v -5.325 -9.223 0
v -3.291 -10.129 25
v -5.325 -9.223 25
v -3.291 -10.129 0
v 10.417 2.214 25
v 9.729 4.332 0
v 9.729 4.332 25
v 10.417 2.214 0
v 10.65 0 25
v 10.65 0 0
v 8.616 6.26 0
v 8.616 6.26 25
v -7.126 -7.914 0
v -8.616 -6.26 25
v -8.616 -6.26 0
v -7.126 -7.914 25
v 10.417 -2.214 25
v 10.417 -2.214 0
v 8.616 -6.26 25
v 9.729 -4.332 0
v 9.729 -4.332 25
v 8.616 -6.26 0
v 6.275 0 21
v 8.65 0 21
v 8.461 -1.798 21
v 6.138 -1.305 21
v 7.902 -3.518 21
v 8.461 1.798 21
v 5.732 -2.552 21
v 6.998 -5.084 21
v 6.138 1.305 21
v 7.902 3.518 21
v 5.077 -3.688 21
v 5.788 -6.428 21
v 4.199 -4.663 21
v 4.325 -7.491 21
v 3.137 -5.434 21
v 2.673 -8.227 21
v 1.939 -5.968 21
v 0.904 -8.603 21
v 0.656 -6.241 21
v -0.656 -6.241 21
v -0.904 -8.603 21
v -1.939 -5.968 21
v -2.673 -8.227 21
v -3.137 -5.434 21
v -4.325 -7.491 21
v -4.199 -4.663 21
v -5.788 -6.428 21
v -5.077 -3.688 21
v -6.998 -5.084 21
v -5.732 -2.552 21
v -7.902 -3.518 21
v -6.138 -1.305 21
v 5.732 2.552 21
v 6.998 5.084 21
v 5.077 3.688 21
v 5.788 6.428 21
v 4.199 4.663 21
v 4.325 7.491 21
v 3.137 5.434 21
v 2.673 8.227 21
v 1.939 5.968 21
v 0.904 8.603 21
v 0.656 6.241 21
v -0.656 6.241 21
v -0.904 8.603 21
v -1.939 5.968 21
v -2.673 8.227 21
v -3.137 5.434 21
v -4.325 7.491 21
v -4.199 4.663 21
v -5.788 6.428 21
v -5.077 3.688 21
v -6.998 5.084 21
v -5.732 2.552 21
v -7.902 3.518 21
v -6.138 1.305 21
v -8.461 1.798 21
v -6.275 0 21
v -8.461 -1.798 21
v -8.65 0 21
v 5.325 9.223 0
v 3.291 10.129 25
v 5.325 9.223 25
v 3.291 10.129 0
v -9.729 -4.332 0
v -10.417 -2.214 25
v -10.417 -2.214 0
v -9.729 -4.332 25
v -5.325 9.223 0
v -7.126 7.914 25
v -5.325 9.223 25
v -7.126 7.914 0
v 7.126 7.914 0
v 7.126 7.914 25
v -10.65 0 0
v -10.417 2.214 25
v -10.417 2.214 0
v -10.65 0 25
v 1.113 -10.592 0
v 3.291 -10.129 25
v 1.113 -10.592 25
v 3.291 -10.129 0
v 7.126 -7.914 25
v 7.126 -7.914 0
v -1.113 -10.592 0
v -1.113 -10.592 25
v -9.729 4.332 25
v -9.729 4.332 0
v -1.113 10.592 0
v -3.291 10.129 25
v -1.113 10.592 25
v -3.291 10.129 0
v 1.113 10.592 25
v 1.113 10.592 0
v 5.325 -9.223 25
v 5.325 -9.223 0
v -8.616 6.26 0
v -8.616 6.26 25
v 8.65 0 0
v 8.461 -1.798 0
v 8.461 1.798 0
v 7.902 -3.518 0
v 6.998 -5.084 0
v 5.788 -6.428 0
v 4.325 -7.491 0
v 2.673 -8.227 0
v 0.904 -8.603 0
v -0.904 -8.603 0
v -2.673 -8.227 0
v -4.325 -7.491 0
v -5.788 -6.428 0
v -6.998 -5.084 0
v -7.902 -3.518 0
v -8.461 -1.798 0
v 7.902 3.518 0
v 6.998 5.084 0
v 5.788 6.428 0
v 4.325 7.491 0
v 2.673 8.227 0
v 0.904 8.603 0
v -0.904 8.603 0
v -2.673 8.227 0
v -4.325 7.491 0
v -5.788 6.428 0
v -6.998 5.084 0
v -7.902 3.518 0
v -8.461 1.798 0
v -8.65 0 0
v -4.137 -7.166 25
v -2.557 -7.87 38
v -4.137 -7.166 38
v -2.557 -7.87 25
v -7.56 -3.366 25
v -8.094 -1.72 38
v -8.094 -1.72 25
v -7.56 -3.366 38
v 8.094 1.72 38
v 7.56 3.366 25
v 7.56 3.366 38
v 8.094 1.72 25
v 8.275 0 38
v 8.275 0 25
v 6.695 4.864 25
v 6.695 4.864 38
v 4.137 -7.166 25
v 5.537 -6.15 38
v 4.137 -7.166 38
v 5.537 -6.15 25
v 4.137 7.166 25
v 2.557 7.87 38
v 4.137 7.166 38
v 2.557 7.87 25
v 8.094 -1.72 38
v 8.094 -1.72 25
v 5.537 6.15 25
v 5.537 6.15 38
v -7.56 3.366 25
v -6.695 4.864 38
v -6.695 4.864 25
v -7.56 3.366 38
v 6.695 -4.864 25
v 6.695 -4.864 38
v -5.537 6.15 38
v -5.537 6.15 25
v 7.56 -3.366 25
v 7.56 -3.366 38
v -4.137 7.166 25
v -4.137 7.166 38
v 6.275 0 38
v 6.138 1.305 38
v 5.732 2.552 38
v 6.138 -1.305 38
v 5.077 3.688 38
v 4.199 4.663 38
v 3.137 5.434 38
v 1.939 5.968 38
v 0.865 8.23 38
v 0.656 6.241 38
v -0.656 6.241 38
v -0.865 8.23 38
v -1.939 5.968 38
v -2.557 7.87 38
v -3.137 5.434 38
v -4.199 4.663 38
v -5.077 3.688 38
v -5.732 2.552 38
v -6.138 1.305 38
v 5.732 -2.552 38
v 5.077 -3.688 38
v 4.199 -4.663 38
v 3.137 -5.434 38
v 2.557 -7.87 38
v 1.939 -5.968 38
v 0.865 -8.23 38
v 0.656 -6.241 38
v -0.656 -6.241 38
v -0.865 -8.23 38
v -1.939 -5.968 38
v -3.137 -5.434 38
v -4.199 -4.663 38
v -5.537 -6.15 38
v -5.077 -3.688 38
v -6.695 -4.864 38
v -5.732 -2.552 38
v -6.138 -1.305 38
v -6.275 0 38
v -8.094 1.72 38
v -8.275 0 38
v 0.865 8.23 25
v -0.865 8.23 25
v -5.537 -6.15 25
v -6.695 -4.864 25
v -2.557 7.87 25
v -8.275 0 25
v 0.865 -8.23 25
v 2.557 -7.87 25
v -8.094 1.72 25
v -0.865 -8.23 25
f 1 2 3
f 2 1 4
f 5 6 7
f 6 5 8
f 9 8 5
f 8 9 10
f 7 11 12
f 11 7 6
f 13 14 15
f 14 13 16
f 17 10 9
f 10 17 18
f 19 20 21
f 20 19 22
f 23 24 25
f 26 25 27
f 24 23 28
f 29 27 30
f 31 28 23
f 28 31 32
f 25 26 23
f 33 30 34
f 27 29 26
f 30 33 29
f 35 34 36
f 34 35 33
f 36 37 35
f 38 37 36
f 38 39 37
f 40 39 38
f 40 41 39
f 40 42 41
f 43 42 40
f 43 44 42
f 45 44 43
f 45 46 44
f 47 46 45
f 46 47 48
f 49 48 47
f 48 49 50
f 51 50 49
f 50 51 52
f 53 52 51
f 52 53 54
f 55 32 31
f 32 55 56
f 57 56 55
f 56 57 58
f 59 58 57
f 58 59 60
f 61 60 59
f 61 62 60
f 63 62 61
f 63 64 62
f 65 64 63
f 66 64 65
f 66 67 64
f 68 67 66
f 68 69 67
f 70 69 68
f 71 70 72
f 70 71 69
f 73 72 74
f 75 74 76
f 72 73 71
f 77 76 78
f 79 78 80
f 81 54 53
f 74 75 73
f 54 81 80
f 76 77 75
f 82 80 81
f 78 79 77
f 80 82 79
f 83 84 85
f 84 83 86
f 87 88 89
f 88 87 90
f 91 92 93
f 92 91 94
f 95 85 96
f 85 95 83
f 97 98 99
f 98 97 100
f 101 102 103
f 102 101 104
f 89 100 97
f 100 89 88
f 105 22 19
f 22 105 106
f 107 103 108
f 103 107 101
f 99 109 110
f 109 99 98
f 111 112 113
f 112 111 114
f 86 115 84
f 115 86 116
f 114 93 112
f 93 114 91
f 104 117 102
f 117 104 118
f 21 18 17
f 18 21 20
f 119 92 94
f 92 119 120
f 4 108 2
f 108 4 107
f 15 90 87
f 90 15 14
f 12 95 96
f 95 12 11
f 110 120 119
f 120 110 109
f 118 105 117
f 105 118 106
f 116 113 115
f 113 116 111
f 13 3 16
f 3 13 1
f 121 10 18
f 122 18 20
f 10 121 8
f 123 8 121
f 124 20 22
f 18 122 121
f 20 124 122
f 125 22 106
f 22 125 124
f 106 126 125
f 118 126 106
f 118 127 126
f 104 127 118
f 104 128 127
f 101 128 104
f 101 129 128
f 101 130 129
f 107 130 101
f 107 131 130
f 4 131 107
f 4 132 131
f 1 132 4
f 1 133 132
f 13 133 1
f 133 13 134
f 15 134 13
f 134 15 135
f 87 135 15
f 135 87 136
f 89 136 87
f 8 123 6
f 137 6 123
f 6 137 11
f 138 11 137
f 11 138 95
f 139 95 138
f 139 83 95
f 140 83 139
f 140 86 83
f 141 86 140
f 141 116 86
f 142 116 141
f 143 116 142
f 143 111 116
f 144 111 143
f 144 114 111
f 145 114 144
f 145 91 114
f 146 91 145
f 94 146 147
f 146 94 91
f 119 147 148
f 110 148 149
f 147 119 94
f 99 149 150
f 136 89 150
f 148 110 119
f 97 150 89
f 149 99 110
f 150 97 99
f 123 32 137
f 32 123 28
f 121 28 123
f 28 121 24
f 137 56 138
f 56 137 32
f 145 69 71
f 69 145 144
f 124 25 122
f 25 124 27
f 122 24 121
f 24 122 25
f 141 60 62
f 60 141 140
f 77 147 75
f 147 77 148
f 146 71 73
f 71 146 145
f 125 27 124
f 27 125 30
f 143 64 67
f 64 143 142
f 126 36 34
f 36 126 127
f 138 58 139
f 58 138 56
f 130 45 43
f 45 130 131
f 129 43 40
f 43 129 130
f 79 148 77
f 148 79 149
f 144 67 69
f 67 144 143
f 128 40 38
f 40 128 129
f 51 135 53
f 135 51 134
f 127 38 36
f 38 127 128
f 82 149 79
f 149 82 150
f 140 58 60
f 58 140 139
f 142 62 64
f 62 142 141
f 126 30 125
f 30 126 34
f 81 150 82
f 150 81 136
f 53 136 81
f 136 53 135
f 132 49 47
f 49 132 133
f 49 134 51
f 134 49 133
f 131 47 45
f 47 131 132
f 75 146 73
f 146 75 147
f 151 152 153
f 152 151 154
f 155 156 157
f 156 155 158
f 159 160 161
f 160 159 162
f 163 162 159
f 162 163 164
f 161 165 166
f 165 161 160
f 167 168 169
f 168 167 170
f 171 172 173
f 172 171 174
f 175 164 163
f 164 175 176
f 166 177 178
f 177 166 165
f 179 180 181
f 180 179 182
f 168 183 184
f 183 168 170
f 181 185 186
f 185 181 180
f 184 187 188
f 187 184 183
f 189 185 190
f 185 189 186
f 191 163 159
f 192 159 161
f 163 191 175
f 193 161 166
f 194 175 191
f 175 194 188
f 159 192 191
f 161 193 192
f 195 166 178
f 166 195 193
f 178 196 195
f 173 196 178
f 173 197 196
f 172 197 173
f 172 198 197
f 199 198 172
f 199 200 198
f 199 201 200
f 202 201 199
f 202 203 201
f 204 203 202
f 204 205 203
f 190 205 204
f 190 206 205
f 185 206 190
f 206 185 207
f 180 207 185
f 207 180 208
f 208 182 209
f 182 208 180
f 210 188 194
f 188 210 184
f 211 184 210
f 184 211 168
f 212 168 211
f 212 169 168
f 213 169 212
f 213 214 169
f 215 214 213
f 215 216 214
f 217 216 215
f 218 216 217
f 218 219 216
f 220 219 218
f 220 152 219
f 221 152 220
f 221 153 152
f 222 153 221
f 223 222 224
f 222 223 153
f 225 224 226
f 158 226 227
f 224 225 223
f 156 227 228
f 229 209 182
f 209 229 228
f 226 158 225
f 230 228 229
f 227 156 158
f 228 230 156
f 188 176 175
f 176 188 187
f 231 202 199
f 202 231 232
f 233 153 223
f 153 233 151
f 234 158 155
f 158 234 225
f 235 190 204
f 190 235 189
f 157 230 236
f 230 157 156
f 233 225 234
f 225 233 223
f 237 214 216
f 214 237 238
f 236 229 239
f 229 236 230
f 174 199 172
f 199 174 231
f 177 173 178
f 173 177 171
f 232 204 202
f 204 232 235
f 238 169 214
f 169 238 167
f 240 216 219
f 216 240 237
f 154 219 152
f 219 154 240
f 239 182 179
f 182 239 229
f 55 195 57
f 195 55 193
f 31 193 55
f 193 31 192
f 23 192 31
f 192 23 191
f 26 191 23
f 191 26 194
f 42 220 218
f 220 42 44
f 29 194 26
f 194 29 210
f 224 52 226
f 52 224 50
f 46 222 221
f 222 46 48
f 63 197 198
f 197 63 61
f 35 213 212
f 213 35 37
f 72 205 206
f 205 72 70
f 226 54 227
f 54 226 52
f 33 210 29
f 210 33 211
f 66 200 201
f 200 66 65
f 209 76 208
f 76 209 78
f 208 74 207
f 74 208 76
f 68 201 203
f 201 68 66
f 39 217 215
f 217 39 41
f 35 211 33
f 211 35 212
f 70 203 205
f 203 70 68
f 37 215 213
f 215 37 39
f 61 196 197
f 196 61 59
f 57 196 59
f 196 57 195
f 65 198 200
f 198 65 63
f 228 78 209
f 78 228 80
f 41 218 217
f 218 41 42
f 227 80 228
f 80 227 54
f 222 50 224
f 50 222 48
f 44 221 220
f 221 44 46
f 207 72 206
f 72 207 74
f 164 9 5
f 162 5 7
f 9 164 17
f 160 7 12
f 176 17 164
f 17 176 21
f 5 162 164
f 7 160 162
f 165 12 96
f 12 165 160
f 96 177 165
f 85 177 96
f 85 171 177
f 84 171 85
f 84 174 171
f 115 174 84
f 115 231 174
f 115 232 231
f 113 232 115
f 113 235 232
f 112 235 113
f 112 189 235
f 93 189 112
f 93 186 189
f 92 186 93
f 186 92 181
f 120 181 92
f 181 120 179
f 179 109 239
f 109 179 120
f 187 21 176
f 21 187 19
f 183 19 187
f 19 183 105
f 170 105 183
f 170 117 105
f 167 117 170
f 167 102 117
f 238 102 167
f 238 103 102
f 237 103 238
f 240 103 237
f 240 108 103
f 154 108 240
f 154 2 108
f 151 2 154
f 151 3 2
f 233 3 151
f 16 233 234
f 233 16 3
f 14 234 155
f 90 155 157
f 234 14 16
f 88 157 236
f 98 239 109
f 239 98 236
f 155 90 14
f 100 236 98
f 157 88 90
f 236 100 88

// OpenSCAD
/*
Pipe adapter 16mm to 17mm ID
Remixed for https://www.thingiverse.com/thing:5990046

Created November 24, 2023
Modified September 28, 2024
*/

adapt_t = 2;

ws_id = 17.45 - 0.15; // weather station ID
ws_od = ws_id + 2 * adapt_t;
ws_h = 21;

ring_h = 2;

pipe_od = 16.4 + 0.15; // amazon pipe ID
pipe_id = pipe_od - 2 * adapt_t;
pipe_h = 15 + ring_h;


$fs = 0.1;

// weather station connection
difference() {
    cylinder(d=ws_od, h=ws_h);
    cylinder(d=ws_id, h=ws_h);
}

translate([0, 0, ws_h]) {
    // amazon pipe connection
    difference() {
        cylinder(d=pipe_od, h=pipe_h);
        cylinder(d=pipe_id, h=pipe_h);
    }

    // ring
    difference() {
        cylinder(d=ws_od, h=2*adapt_t);
        cylinder(d=pipe_id, h=2*adapt_t);
    }
}
